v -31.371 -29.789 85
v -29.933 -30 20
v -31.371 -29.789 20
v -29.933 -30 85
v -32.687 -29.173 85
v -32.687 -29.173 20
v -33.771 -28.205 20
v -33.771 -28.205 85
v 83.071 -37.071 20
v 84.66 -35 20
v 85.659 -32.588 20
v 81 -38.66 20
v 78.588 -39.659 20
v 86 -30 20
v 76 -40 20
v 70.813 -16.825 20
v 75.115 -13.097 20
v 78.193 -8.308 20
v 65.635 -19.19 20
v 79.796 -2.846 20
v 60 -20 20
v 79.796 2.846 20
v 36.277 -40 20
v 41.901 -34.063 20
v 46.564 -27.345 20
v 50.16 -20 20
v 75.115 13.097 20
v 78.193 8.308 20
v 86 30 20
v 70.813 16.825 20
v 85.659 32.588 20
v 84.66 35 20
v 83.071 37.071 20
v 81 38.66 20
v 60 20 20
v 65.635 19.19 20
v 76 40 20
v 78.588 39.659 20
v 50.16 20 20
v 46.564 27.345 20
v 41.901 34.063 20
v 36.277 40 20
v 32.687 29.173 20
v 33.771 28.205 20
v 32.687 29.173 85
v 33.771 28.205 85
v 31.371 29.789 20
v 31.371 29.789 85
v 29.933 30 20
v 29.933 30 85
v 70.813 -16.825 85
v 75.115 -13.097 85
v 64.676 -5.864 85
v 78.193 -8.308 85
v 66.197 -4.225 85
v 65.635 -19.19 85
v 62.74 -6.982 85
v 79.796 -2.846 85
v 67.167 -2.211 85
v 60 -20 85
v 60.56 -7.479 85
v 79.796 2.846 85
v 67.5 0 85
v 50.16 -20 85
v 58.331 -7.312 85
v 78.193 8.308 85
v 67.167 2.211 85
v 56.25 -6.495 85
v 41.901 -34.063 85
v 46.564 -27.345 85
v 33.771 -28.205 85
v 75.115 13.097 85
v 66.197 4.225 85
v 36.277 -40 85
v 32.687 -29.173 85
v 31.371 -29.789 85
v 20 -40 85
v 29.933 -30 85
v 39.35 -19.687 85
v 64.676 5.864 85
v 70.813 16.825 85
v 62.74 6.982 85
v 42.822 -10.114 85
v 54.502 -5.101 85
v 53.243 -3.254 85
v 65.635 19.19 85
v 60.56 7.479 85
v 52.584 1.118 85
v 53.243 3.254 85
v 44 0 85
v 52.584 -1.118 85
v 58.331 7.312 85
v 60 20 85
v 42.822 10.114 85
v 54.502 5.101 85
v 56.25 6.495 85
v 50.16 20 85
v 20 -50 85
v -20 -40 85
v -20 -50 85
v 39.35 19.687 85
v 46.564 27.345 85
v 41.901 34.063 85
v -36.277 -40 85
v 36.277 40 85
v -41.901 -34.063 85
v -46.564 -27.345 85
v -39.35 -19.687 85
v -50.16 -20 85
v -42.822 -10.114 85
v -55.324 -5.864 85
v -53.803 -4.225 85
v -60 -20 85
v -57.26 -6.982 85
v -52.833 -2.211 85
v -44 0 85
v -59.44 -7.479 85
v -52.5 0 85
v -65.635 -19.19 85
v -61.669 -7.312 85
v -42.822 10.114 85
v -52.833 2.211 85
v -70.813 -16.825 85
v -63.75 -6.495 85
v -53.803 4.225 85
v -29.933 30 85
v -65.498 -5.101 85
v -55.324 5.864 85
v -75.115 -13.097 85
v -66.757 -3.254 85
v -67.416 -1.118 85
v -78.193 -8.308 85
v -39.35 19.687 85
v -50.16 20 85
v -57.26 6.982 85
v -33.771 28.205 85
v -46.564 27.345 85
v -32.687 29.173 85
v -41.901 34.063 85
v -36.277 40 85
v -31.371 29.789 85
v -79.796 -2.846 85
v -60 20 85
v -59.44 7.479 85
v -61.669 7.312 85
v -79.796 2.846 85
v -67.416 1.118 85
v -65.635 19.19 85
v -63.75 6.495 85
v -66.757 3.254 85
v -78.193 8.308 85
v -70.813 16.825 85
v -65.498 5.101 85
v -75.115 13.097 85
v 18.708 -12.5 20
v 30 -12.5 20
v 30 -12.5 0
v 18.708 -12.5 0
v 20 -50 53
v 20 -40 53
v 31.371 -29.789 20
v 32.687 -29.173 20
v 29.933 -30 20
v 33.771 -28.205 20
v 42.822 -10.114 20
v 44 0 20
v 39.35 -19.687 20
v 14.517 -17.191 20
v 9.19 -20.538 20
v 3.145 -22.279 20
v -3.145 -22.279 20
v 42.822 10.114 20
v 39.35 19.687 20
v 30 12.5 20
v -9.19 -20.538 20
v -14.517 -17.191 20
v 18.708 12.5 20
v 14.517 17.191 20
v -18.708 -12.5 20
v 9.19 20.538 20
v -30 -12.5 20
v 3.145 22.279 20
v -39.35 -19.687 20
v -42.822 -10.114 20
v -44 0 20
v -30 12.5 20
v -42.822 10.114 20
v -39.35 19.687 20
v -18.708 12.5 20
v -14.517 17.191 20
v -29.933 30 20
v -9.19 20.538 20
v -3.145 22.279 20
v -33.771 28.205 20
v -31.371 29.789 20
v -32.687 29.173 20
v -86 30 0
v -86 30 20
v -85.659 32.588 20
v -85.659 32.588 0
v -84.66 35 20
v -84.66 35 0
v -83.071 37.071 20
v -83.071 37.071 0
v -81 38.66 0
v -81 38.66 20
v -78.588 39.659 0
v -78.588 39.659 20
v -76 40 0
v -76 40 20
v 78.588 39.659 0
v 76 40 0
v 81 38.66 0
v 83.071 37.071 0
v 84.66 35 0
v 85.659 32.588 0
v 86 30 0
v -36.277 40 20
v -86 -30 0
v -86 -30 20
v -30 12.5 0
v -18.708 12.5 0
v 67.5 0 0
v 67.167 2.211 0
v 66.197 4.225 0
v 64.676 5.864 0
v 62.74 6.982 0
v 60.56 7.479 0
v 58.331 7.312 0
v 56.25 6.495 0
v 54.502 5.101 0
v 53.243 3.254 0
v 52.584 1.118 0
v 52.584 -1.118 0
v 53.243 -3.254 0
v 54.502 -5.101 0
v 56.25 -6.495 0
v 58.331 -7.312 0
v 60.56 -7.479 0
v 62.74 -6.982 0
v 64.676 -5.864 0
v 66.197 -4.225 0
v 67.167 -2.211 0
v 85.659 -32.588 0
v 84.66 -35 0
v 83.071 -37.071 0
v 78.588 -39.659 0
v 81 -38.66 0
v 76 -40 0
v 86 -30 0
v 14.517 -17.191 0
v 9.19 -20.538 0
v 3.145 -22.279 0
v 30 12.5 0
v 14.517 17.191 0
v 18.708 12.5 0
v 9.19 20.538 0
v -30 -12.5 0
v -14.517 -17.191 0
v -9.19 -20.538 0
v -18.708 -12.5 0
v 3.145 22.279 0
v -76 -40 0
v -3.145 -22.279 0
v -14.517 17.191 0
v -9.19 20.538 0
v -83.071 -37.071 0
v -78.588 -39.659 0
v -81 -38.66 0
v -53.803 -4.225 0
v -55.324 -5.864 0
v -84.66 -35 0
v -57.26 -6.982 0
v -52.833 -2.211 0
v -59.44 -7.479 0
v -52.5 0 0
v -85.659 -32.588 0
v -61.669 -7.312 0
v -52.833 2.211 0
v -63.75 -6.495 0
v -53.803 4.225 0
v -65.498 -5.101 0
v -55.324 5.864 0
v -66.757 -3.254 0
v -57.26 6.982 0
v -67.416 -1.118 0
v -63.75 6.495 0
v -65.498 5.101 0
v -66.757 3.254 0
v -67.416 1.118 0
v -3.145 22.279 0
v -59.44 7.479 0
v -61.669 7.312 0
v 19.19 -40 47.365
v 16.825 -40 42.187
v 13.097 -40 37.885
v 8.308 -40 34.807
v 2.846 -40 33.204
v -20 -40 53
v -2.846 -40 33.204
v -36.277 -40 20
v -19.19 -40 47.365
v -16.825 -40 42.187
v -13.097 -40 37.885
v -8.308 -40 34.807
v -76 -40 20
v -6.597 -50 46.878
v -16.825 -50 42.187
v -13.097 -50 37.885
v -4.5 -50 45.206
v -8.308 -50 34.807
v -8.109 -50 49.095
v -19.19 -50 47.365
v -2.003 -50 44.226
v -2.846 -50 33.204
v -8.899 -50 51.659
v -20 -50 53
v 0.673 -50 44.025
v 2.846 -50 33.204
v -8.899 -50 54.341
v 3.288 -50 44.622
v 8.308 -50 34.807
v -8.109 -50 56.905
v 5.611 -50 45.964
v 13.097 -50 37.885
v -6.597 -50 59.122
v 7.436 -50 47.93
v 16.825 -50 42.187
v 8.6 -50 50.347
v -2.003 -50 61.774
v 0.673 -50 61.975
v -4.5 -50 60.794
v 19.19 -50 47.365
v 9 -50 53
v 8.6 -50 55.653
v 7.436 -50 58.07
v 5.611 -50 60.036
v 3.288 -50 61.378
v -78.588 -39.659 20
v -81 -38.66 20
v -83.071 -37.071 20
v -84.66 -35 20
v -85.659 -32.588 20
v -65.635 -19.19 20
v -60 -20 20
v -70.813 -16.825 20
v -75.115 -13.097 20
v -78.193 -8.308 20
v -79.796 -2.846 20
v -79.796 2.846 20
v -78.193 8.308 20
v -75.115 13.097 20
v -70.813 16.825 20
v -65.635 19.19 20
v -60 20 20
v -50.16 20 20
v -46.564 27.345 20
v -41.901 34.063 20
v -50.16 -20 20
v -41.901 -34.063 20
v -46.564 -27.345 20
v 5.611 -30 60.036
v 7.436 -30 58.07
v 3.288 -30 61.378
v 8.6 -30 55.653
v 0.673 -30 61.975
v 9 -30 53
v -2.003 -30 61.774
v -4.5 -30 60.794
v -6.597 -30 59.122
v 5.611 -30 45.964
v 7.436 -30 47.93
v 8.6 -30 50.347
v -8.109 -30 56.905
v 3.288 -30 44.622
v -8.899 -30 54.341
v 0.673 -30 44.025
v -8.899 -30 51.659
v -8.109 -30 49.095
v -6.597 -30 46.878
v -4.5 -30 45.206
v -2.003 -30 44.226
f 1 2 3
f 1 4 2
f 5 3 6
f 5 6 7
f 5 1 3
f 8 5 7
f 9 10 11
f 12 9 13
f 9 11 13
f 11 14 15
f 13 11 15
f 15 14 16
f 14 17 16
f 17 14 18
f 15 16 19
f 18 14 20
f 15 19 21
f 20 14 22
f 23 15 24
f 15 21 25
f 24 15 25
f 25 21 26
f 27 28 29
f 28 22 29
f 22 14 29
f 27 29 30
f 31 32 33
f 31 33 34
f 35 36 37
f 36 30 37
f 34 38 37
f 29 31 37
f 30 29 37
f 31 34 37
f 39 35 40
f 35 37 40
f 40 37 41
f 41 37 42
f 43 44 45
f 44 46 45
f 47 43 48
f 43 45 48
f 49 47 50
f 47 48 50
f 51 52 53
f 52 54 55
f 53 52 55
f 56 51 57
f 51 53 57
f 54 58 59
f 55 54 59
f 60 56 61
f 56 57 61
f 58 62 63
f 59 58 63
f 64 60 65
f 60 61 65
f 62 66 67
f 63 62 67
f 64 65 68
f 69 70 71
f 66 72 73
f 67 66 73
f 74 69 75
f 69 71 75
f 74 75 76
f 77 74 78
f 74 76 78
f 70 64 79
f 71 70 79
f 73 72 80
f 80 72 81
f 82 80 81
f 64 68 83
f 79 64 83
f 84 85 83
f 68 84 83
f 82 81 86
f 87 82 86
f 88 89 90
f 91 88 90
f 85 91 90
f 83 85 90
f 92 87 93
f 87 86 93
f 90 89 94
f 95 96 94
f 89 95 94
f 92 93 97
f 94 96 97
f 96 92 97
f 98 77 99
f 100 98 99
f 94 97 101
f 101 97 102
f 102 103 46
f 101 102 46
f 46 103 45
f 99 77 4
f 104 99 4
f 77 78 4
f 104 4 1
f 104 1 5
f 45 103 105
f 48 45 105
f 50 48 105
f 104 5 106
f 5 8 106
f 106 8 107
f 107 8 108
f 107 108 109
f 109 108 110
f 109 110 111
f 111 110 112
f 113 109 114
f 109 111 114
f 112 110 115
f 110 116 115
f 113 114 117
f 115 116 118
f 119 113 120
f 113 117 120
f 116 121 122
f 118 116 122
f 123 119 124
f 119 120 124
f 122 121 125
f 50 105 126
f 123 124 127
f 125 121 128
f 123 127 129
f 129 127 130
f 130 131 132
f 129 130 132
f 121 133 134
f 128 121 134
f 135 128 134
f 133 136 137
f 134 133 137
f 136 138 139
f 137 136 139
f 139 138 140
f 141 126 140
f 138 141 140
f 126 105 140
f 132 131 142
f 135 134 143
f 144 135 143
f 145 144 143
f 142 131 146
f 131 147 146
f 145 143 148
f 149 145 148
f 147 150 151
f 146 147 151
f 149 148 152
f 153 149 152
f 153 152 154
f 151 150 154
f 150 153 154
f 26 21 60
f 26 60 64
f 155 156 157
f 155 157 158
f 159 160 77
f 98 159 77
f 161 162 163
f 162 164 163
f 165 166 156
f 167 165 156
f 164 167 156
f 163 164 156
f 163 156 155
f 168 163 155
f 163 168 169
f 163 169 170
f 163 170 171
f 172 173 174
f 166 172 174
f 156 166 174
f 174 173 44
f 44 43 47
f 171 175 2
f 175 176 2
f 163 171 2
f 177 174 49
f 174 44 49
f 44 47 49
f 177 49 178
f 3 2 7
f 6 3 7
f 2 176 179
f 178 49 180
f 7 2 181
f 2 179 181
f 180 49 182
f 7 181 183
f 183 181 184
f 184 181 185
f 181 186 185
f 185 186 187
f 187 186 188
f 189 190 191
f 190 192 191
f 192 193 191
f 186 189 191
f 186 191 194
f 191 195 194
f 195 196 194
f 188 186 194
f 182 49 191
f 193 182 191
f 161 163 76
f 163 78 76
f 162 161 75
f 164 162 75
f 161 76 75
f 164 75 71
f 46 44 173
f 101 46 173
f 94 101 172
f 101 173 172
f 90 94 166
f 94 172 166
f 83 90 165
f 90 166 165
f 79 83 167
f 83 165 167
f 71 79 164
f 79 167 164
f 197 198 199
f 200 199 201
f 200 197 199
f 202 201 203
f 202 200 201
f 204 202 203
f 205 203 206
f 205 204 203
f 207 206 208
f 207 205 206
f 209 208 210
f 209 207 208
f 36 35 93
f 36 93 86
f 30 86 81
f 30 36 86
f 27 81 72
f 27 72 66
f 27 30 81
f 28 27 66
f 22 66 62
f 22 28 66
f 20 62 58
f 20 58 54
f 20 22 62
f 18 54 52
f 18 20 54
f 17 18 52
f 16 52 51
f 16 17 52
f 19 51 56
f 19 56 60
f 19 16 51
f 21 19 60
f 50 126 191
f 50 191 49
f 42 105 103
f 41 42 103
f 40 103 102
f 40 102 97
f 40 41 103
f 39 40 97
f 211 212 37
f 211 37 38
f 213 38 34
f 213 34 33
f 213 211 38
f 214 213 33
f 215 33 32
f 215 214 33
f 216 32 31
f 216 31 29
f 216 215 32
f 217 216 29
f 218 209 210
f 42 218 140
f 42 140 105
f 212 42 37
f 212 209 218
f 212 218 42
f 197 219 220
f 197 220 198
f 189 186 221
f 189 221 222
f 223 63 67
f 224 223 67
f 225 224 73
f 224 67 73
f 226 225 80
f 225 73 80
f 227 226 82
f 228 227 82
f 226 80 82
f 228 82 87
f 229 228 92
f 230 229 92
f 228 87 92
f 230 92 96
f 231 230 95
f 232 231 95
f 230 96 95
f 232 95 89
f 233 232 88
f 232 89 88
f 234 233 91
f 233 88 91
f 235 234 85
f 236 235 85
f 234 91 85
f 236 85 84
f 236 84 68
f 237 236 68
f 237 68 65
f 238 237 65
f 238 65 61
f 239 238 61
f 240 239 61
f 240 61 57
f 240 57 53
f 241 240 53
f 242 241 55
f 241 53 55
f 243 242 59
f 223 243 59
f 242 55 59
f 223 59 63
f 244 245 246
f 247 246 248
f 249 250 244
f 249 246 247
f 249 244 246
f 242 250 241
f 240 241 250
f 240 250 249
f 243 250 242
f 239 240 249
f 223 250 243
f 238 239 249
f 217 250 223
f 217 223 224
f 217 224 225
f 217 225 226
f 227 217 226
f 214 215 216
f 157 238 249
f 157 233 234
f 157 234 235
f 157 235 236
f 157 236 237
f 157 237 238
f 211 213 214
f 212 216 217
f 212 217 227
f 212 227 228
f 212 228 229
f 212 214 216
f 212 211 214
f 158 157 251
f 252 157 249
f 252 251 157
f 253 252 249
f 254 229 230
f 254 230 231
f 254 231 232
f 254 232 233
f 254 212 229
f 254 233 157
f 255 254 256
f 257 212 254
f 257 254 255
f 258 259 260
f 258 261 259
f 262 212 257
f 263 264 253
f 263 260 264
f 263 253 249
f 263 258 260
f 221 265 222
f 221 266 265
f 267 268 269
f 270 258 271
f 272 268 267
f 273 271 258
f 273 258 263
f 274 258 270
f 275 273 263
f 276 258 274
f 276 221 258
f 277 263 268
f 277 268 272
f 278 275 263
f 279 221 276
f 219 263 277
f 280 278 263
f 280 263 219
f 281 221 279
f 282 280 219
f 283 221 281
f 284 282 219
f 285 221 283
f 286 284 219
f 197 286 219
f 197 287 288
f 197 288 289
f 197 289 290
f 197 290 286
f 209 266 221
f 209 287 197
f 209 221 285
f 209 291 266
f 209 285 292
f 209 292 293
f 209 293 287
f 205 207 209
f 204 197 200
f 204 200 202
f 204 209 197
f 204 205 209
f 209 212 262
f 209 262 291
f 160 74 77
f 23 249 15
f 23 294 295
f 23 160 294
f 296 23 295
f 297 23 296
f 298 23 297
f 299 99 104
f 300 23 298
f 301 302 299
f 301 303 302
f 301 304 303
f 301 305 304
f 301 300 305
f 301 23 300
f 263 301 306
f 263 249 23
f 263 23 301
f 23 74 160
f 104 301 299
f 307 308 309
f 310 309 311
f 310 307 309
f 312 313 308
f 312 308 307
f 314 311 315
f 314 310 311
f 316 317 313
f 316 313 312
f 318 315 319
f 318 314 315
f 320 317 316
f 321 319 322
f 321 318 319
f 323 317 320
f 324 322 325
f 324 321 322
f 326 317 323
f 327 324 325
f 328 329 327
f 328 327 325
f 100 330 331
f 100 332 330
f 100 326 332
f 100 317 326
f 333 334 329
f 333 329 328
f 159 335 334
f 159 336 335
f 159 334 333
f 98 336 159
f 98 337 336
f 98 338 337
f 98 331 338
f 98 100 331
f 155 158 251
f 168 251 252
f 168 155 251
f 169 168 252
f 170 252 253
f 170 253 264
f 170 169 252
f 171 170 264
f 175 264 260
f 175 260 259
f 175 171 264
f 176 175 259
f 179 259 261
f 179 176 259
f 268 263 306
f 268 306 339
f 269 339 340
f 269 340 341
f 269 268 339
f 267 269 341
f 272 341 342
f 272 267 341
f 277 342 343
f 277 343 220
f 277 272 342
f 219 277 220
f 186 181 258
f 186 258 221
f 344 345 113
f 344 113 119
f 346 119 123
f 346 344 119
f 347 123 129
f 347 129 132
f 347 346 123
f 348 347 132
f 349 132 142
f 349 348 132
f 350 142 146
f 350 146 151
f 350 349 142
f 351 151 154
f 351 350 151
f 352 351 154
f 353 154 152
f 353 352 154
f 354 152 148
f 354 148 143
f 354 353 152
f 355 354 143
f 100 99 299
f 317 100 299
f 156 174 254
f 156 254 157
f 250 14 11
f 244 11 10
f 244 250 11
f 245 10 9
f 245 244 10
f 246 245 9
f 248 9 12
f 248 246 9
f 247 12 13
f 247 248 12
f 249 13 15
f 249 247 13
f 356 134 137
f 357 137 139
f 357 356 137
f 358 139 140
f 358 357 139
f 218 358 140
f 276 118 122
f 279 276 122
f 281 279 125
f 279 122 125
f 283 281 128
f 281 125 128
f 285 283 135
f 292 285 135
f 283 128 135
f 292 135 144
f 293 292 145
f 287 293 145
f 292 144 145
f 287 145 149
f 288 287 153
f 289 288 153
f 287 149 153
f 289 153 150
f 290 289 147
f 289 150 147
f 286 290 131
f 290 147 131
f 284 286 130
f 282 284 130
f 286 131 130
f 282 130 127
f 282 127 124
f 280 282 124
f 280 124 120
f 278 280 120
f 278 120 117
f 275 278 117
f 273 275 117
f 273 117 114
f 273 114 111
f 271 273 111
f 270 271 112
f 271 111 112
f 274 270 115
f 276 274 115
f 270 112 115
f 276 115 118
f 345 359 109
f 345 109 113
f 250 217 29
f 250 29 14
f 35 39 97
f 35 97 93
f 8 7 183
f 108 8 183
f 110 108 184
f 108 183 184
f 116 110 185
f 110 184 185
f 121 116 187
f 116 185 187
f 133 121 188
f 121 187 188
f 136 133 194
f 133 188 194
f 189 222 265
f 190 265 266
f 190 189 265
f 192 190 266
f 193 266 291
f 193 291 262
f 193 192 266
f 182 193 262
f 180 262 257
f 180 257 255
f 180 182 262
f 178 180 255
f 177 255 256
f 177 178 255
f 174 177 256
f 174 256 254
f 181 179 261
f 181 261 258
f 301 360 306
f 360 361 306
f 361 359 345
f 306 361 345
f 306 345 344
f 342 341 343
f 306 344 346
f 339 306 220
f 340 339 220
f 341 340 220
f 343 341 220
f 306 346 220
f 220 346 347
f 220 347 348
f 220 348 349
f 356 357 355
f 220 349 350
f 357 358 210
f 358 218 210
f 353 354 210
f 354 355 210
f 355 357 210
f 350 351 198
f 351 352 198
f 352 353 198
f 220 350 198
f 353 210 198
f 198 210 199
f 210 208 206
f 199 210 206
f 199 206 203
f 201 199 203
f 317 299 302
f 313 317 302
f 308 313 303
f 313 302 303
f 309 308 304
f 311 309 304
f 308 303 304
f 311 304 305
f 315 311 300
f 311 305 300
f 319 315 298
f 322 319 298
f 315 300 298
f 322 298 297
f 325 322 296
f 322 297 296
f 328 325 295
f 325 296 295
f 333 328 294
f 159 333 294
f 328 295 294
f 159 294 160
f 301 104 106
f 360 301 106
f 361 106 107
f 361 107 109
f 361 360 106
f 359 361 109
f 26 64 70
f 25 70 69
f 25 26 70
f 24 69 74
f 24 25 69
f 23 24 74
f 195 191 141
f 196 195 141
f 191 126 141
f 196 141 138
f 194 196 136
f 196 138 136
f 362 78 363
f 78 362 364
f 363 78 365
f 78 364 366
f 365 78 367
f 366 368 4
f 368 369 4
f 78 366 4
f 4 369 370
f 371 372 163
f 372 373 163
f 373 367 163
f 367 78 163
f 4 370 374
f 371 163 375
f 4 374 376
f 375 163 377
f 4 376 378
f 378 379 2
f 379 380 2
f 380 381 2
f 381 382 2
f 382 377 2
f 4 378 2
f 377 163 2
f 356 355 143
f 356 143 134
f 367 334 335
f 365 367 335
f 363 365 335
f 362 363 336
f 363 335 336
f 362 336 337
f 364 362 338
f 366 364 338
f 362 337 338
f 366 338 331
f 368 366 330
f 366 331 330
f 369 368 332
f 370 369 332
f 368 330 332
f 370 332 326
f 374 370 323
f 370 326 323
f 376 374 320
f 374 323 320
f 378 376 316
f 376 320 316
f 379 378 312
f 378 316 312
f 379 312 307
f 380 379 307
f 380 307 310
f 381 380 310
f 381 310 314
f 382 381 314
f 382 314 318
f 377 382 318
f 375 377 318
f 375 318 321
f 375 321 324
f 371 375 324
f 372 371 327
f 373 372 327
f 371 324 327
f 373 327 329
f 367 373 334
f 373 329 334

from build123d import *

# Parameters (mm, degrees)
EXTRUDE_1_DEPTH     = 20
EXTRUDE_2_DEPTH     = 65
SKETCH_4_R          = 7.5
CUT_EXTRUDE_1_DEPTH = 85
CUT_EXTRUDE_2_DEPTH = 20
EXTRUDE_3_DEPTH     = 10
SKETCH_7_R          = 9
CUT_EXTRUDE_3_DEPTH = 20
FILLET_1_R          = 5


with BuildPart() as part:
    # 草图1 → 凸台-拉伸1 (new body)
    with BuildSketch(Plane.XY):
        with BuildLine():
            Line((76, -40), (-76, -40))
            ThreePointArc((-76, -40), (-83.071067812, -37.071067812), (-86, -30))
            Line((-86, -30), (-86, 30))
            ThreePointArc((-86, 30), (-83.071067812, 37.071067812), (-76, 40))
            Line((-76, 40), (76, 40))
            ThreePointArc((76, 40), (83.071067812, 37.071067812), (86, 30))
            Line((86, 30), (86, -30))
            ThreePointArc((86, -30), (83.071067812, -37.071067812), (76, -40))
        make_face()
    extrude(amount=EXTRUDE_1_DEPTH)

    # 草图3 → 凸台-拉伸2 (add)
    with BuildSketch(Plane.XY.offset(20)):
        with BuildLine():
            Line((-36.276714294, 40), (36.276714294, 40))
            ThreePointArc((36.276714294, 40), (44.36006499, 30.792606809), (50.159744816, 20))
            Line((50.159744816, 20), (60, 20))
            ThreePointArc((60, 20), (80, 0), (60, -20))
            Line((60, -20), (50.159744816, -20))
            ThreePointArc((50.159744816, -20), (44.36006499, -30.792606809), (36.276714294, -40))
            Line((36.276714294, -40), (-36.276714294, -40))
            ThreePointArc((-36.276714294, -40), (-44.36006499, -30.792606809), (-50.159744816, -20))
            Line((-50.159744816, -20), (-60, -20))
            ThreePointArc((-60, -20), (-80, 0), (-60, 20))
            Line((-60, 20), (-50.159744816, 20))
            ThreePointArc((-50.159744816, 20), (-44.36006499, 30.792606809), (-36.276714294, 40))
        make_face()
        with BuildLine():
            Line((32.186953879, -30), (-32.186953879, -30))
            ThreePointArc((-32.186953879, -30), (-44, 0), (-32.186953879, 30))
            Line((-32.186953879, 30), (32.186953879, 30))
            ThreePointArc((32.186953879, 30), (44, 0), (32.186953879, -30))
        make_face(mode=Mode.SUBTRACT)
    extrude(amount=EXTRUDE_2_DEPTH)

    # 草图4 → 切除-拉伸1 (cut)
    with BuildSketch(Plane.XY.offset(85)):
        with Locations((-60, 0)):
            Circle(SKETCH_4_R)
        with Locations((60, 0)):
            Circle(SKETCH_4_R)
    extrude(amount=-CUT_EXTRUDE_1_DEPTH, mode=Mode.SUBTRACT)

    # 草图5 → 切除-拉伸2 (cut)
    with BuildSketch(Plane.XY.offset(20)):
        with BuildLine():
            Line((-18.708286934, -12.5), (-30, -12.5))
            Line((-30, -12.5), (-30, 12.5))
            Line((-30, 12.5), (-18.708286934, 12.5))
            ThreePointArc((-18.708286934, 12.5), (0, 22.5), (18.708286934, 12.5))
            Line((18.708286934, 12.5), (30, 12.5))
            Line((30, 12.5), (30, -12.5))
            Line((30, -12.5), (18.708286934, -12.5))
            ThreePointArc((18.708286934, -12.5), (0, -22.5), (-18.708286934, -12.5))
        make_face()
    extrude(amount=-CUT_EXTRUDE_2_DEPTH, mode=Mode.SUBTRACT)

    # 草图6 → 凸台-拉伸3 (add)
    with BuildSketch(Plane.XZ.offset(40)):
        with BuildLine():
            Line((20, 53), (20, 85))
            Line((20, 85), (-20, 85))
            Line((-20, 85), (-20, 53))
            ThreePointArc((-20, 53), (0, 33), (20, 53))
        make_face()
    extrude(amount=EXTRUDE_3_DEPTH)

    # 草图7 → 切除-拉伸3 (cut)
    with BuildSketch(Plane.XZ.offset(50)):
        with Locations((0, 53)):
            Circle(SKETCH_7_R)
    extrude(amount=-CUT_EXTRUDE_3_DEPTH, mode=Mode.SUBTRACT)

    # 圆角1
    fillet_1_edges = [part.edges().sort_by_distance(p)[0] for p in [
        (32.186953879, 30, 52.5),
        (-32.186953879, 30, 52.5),
        (-32.186953879, -30, 52.5),
        (32.186953879, -30, 52.5),
    ]]
    fillet(fillet_1_edges, radius=FILLET_1_R)


solid = part.part
